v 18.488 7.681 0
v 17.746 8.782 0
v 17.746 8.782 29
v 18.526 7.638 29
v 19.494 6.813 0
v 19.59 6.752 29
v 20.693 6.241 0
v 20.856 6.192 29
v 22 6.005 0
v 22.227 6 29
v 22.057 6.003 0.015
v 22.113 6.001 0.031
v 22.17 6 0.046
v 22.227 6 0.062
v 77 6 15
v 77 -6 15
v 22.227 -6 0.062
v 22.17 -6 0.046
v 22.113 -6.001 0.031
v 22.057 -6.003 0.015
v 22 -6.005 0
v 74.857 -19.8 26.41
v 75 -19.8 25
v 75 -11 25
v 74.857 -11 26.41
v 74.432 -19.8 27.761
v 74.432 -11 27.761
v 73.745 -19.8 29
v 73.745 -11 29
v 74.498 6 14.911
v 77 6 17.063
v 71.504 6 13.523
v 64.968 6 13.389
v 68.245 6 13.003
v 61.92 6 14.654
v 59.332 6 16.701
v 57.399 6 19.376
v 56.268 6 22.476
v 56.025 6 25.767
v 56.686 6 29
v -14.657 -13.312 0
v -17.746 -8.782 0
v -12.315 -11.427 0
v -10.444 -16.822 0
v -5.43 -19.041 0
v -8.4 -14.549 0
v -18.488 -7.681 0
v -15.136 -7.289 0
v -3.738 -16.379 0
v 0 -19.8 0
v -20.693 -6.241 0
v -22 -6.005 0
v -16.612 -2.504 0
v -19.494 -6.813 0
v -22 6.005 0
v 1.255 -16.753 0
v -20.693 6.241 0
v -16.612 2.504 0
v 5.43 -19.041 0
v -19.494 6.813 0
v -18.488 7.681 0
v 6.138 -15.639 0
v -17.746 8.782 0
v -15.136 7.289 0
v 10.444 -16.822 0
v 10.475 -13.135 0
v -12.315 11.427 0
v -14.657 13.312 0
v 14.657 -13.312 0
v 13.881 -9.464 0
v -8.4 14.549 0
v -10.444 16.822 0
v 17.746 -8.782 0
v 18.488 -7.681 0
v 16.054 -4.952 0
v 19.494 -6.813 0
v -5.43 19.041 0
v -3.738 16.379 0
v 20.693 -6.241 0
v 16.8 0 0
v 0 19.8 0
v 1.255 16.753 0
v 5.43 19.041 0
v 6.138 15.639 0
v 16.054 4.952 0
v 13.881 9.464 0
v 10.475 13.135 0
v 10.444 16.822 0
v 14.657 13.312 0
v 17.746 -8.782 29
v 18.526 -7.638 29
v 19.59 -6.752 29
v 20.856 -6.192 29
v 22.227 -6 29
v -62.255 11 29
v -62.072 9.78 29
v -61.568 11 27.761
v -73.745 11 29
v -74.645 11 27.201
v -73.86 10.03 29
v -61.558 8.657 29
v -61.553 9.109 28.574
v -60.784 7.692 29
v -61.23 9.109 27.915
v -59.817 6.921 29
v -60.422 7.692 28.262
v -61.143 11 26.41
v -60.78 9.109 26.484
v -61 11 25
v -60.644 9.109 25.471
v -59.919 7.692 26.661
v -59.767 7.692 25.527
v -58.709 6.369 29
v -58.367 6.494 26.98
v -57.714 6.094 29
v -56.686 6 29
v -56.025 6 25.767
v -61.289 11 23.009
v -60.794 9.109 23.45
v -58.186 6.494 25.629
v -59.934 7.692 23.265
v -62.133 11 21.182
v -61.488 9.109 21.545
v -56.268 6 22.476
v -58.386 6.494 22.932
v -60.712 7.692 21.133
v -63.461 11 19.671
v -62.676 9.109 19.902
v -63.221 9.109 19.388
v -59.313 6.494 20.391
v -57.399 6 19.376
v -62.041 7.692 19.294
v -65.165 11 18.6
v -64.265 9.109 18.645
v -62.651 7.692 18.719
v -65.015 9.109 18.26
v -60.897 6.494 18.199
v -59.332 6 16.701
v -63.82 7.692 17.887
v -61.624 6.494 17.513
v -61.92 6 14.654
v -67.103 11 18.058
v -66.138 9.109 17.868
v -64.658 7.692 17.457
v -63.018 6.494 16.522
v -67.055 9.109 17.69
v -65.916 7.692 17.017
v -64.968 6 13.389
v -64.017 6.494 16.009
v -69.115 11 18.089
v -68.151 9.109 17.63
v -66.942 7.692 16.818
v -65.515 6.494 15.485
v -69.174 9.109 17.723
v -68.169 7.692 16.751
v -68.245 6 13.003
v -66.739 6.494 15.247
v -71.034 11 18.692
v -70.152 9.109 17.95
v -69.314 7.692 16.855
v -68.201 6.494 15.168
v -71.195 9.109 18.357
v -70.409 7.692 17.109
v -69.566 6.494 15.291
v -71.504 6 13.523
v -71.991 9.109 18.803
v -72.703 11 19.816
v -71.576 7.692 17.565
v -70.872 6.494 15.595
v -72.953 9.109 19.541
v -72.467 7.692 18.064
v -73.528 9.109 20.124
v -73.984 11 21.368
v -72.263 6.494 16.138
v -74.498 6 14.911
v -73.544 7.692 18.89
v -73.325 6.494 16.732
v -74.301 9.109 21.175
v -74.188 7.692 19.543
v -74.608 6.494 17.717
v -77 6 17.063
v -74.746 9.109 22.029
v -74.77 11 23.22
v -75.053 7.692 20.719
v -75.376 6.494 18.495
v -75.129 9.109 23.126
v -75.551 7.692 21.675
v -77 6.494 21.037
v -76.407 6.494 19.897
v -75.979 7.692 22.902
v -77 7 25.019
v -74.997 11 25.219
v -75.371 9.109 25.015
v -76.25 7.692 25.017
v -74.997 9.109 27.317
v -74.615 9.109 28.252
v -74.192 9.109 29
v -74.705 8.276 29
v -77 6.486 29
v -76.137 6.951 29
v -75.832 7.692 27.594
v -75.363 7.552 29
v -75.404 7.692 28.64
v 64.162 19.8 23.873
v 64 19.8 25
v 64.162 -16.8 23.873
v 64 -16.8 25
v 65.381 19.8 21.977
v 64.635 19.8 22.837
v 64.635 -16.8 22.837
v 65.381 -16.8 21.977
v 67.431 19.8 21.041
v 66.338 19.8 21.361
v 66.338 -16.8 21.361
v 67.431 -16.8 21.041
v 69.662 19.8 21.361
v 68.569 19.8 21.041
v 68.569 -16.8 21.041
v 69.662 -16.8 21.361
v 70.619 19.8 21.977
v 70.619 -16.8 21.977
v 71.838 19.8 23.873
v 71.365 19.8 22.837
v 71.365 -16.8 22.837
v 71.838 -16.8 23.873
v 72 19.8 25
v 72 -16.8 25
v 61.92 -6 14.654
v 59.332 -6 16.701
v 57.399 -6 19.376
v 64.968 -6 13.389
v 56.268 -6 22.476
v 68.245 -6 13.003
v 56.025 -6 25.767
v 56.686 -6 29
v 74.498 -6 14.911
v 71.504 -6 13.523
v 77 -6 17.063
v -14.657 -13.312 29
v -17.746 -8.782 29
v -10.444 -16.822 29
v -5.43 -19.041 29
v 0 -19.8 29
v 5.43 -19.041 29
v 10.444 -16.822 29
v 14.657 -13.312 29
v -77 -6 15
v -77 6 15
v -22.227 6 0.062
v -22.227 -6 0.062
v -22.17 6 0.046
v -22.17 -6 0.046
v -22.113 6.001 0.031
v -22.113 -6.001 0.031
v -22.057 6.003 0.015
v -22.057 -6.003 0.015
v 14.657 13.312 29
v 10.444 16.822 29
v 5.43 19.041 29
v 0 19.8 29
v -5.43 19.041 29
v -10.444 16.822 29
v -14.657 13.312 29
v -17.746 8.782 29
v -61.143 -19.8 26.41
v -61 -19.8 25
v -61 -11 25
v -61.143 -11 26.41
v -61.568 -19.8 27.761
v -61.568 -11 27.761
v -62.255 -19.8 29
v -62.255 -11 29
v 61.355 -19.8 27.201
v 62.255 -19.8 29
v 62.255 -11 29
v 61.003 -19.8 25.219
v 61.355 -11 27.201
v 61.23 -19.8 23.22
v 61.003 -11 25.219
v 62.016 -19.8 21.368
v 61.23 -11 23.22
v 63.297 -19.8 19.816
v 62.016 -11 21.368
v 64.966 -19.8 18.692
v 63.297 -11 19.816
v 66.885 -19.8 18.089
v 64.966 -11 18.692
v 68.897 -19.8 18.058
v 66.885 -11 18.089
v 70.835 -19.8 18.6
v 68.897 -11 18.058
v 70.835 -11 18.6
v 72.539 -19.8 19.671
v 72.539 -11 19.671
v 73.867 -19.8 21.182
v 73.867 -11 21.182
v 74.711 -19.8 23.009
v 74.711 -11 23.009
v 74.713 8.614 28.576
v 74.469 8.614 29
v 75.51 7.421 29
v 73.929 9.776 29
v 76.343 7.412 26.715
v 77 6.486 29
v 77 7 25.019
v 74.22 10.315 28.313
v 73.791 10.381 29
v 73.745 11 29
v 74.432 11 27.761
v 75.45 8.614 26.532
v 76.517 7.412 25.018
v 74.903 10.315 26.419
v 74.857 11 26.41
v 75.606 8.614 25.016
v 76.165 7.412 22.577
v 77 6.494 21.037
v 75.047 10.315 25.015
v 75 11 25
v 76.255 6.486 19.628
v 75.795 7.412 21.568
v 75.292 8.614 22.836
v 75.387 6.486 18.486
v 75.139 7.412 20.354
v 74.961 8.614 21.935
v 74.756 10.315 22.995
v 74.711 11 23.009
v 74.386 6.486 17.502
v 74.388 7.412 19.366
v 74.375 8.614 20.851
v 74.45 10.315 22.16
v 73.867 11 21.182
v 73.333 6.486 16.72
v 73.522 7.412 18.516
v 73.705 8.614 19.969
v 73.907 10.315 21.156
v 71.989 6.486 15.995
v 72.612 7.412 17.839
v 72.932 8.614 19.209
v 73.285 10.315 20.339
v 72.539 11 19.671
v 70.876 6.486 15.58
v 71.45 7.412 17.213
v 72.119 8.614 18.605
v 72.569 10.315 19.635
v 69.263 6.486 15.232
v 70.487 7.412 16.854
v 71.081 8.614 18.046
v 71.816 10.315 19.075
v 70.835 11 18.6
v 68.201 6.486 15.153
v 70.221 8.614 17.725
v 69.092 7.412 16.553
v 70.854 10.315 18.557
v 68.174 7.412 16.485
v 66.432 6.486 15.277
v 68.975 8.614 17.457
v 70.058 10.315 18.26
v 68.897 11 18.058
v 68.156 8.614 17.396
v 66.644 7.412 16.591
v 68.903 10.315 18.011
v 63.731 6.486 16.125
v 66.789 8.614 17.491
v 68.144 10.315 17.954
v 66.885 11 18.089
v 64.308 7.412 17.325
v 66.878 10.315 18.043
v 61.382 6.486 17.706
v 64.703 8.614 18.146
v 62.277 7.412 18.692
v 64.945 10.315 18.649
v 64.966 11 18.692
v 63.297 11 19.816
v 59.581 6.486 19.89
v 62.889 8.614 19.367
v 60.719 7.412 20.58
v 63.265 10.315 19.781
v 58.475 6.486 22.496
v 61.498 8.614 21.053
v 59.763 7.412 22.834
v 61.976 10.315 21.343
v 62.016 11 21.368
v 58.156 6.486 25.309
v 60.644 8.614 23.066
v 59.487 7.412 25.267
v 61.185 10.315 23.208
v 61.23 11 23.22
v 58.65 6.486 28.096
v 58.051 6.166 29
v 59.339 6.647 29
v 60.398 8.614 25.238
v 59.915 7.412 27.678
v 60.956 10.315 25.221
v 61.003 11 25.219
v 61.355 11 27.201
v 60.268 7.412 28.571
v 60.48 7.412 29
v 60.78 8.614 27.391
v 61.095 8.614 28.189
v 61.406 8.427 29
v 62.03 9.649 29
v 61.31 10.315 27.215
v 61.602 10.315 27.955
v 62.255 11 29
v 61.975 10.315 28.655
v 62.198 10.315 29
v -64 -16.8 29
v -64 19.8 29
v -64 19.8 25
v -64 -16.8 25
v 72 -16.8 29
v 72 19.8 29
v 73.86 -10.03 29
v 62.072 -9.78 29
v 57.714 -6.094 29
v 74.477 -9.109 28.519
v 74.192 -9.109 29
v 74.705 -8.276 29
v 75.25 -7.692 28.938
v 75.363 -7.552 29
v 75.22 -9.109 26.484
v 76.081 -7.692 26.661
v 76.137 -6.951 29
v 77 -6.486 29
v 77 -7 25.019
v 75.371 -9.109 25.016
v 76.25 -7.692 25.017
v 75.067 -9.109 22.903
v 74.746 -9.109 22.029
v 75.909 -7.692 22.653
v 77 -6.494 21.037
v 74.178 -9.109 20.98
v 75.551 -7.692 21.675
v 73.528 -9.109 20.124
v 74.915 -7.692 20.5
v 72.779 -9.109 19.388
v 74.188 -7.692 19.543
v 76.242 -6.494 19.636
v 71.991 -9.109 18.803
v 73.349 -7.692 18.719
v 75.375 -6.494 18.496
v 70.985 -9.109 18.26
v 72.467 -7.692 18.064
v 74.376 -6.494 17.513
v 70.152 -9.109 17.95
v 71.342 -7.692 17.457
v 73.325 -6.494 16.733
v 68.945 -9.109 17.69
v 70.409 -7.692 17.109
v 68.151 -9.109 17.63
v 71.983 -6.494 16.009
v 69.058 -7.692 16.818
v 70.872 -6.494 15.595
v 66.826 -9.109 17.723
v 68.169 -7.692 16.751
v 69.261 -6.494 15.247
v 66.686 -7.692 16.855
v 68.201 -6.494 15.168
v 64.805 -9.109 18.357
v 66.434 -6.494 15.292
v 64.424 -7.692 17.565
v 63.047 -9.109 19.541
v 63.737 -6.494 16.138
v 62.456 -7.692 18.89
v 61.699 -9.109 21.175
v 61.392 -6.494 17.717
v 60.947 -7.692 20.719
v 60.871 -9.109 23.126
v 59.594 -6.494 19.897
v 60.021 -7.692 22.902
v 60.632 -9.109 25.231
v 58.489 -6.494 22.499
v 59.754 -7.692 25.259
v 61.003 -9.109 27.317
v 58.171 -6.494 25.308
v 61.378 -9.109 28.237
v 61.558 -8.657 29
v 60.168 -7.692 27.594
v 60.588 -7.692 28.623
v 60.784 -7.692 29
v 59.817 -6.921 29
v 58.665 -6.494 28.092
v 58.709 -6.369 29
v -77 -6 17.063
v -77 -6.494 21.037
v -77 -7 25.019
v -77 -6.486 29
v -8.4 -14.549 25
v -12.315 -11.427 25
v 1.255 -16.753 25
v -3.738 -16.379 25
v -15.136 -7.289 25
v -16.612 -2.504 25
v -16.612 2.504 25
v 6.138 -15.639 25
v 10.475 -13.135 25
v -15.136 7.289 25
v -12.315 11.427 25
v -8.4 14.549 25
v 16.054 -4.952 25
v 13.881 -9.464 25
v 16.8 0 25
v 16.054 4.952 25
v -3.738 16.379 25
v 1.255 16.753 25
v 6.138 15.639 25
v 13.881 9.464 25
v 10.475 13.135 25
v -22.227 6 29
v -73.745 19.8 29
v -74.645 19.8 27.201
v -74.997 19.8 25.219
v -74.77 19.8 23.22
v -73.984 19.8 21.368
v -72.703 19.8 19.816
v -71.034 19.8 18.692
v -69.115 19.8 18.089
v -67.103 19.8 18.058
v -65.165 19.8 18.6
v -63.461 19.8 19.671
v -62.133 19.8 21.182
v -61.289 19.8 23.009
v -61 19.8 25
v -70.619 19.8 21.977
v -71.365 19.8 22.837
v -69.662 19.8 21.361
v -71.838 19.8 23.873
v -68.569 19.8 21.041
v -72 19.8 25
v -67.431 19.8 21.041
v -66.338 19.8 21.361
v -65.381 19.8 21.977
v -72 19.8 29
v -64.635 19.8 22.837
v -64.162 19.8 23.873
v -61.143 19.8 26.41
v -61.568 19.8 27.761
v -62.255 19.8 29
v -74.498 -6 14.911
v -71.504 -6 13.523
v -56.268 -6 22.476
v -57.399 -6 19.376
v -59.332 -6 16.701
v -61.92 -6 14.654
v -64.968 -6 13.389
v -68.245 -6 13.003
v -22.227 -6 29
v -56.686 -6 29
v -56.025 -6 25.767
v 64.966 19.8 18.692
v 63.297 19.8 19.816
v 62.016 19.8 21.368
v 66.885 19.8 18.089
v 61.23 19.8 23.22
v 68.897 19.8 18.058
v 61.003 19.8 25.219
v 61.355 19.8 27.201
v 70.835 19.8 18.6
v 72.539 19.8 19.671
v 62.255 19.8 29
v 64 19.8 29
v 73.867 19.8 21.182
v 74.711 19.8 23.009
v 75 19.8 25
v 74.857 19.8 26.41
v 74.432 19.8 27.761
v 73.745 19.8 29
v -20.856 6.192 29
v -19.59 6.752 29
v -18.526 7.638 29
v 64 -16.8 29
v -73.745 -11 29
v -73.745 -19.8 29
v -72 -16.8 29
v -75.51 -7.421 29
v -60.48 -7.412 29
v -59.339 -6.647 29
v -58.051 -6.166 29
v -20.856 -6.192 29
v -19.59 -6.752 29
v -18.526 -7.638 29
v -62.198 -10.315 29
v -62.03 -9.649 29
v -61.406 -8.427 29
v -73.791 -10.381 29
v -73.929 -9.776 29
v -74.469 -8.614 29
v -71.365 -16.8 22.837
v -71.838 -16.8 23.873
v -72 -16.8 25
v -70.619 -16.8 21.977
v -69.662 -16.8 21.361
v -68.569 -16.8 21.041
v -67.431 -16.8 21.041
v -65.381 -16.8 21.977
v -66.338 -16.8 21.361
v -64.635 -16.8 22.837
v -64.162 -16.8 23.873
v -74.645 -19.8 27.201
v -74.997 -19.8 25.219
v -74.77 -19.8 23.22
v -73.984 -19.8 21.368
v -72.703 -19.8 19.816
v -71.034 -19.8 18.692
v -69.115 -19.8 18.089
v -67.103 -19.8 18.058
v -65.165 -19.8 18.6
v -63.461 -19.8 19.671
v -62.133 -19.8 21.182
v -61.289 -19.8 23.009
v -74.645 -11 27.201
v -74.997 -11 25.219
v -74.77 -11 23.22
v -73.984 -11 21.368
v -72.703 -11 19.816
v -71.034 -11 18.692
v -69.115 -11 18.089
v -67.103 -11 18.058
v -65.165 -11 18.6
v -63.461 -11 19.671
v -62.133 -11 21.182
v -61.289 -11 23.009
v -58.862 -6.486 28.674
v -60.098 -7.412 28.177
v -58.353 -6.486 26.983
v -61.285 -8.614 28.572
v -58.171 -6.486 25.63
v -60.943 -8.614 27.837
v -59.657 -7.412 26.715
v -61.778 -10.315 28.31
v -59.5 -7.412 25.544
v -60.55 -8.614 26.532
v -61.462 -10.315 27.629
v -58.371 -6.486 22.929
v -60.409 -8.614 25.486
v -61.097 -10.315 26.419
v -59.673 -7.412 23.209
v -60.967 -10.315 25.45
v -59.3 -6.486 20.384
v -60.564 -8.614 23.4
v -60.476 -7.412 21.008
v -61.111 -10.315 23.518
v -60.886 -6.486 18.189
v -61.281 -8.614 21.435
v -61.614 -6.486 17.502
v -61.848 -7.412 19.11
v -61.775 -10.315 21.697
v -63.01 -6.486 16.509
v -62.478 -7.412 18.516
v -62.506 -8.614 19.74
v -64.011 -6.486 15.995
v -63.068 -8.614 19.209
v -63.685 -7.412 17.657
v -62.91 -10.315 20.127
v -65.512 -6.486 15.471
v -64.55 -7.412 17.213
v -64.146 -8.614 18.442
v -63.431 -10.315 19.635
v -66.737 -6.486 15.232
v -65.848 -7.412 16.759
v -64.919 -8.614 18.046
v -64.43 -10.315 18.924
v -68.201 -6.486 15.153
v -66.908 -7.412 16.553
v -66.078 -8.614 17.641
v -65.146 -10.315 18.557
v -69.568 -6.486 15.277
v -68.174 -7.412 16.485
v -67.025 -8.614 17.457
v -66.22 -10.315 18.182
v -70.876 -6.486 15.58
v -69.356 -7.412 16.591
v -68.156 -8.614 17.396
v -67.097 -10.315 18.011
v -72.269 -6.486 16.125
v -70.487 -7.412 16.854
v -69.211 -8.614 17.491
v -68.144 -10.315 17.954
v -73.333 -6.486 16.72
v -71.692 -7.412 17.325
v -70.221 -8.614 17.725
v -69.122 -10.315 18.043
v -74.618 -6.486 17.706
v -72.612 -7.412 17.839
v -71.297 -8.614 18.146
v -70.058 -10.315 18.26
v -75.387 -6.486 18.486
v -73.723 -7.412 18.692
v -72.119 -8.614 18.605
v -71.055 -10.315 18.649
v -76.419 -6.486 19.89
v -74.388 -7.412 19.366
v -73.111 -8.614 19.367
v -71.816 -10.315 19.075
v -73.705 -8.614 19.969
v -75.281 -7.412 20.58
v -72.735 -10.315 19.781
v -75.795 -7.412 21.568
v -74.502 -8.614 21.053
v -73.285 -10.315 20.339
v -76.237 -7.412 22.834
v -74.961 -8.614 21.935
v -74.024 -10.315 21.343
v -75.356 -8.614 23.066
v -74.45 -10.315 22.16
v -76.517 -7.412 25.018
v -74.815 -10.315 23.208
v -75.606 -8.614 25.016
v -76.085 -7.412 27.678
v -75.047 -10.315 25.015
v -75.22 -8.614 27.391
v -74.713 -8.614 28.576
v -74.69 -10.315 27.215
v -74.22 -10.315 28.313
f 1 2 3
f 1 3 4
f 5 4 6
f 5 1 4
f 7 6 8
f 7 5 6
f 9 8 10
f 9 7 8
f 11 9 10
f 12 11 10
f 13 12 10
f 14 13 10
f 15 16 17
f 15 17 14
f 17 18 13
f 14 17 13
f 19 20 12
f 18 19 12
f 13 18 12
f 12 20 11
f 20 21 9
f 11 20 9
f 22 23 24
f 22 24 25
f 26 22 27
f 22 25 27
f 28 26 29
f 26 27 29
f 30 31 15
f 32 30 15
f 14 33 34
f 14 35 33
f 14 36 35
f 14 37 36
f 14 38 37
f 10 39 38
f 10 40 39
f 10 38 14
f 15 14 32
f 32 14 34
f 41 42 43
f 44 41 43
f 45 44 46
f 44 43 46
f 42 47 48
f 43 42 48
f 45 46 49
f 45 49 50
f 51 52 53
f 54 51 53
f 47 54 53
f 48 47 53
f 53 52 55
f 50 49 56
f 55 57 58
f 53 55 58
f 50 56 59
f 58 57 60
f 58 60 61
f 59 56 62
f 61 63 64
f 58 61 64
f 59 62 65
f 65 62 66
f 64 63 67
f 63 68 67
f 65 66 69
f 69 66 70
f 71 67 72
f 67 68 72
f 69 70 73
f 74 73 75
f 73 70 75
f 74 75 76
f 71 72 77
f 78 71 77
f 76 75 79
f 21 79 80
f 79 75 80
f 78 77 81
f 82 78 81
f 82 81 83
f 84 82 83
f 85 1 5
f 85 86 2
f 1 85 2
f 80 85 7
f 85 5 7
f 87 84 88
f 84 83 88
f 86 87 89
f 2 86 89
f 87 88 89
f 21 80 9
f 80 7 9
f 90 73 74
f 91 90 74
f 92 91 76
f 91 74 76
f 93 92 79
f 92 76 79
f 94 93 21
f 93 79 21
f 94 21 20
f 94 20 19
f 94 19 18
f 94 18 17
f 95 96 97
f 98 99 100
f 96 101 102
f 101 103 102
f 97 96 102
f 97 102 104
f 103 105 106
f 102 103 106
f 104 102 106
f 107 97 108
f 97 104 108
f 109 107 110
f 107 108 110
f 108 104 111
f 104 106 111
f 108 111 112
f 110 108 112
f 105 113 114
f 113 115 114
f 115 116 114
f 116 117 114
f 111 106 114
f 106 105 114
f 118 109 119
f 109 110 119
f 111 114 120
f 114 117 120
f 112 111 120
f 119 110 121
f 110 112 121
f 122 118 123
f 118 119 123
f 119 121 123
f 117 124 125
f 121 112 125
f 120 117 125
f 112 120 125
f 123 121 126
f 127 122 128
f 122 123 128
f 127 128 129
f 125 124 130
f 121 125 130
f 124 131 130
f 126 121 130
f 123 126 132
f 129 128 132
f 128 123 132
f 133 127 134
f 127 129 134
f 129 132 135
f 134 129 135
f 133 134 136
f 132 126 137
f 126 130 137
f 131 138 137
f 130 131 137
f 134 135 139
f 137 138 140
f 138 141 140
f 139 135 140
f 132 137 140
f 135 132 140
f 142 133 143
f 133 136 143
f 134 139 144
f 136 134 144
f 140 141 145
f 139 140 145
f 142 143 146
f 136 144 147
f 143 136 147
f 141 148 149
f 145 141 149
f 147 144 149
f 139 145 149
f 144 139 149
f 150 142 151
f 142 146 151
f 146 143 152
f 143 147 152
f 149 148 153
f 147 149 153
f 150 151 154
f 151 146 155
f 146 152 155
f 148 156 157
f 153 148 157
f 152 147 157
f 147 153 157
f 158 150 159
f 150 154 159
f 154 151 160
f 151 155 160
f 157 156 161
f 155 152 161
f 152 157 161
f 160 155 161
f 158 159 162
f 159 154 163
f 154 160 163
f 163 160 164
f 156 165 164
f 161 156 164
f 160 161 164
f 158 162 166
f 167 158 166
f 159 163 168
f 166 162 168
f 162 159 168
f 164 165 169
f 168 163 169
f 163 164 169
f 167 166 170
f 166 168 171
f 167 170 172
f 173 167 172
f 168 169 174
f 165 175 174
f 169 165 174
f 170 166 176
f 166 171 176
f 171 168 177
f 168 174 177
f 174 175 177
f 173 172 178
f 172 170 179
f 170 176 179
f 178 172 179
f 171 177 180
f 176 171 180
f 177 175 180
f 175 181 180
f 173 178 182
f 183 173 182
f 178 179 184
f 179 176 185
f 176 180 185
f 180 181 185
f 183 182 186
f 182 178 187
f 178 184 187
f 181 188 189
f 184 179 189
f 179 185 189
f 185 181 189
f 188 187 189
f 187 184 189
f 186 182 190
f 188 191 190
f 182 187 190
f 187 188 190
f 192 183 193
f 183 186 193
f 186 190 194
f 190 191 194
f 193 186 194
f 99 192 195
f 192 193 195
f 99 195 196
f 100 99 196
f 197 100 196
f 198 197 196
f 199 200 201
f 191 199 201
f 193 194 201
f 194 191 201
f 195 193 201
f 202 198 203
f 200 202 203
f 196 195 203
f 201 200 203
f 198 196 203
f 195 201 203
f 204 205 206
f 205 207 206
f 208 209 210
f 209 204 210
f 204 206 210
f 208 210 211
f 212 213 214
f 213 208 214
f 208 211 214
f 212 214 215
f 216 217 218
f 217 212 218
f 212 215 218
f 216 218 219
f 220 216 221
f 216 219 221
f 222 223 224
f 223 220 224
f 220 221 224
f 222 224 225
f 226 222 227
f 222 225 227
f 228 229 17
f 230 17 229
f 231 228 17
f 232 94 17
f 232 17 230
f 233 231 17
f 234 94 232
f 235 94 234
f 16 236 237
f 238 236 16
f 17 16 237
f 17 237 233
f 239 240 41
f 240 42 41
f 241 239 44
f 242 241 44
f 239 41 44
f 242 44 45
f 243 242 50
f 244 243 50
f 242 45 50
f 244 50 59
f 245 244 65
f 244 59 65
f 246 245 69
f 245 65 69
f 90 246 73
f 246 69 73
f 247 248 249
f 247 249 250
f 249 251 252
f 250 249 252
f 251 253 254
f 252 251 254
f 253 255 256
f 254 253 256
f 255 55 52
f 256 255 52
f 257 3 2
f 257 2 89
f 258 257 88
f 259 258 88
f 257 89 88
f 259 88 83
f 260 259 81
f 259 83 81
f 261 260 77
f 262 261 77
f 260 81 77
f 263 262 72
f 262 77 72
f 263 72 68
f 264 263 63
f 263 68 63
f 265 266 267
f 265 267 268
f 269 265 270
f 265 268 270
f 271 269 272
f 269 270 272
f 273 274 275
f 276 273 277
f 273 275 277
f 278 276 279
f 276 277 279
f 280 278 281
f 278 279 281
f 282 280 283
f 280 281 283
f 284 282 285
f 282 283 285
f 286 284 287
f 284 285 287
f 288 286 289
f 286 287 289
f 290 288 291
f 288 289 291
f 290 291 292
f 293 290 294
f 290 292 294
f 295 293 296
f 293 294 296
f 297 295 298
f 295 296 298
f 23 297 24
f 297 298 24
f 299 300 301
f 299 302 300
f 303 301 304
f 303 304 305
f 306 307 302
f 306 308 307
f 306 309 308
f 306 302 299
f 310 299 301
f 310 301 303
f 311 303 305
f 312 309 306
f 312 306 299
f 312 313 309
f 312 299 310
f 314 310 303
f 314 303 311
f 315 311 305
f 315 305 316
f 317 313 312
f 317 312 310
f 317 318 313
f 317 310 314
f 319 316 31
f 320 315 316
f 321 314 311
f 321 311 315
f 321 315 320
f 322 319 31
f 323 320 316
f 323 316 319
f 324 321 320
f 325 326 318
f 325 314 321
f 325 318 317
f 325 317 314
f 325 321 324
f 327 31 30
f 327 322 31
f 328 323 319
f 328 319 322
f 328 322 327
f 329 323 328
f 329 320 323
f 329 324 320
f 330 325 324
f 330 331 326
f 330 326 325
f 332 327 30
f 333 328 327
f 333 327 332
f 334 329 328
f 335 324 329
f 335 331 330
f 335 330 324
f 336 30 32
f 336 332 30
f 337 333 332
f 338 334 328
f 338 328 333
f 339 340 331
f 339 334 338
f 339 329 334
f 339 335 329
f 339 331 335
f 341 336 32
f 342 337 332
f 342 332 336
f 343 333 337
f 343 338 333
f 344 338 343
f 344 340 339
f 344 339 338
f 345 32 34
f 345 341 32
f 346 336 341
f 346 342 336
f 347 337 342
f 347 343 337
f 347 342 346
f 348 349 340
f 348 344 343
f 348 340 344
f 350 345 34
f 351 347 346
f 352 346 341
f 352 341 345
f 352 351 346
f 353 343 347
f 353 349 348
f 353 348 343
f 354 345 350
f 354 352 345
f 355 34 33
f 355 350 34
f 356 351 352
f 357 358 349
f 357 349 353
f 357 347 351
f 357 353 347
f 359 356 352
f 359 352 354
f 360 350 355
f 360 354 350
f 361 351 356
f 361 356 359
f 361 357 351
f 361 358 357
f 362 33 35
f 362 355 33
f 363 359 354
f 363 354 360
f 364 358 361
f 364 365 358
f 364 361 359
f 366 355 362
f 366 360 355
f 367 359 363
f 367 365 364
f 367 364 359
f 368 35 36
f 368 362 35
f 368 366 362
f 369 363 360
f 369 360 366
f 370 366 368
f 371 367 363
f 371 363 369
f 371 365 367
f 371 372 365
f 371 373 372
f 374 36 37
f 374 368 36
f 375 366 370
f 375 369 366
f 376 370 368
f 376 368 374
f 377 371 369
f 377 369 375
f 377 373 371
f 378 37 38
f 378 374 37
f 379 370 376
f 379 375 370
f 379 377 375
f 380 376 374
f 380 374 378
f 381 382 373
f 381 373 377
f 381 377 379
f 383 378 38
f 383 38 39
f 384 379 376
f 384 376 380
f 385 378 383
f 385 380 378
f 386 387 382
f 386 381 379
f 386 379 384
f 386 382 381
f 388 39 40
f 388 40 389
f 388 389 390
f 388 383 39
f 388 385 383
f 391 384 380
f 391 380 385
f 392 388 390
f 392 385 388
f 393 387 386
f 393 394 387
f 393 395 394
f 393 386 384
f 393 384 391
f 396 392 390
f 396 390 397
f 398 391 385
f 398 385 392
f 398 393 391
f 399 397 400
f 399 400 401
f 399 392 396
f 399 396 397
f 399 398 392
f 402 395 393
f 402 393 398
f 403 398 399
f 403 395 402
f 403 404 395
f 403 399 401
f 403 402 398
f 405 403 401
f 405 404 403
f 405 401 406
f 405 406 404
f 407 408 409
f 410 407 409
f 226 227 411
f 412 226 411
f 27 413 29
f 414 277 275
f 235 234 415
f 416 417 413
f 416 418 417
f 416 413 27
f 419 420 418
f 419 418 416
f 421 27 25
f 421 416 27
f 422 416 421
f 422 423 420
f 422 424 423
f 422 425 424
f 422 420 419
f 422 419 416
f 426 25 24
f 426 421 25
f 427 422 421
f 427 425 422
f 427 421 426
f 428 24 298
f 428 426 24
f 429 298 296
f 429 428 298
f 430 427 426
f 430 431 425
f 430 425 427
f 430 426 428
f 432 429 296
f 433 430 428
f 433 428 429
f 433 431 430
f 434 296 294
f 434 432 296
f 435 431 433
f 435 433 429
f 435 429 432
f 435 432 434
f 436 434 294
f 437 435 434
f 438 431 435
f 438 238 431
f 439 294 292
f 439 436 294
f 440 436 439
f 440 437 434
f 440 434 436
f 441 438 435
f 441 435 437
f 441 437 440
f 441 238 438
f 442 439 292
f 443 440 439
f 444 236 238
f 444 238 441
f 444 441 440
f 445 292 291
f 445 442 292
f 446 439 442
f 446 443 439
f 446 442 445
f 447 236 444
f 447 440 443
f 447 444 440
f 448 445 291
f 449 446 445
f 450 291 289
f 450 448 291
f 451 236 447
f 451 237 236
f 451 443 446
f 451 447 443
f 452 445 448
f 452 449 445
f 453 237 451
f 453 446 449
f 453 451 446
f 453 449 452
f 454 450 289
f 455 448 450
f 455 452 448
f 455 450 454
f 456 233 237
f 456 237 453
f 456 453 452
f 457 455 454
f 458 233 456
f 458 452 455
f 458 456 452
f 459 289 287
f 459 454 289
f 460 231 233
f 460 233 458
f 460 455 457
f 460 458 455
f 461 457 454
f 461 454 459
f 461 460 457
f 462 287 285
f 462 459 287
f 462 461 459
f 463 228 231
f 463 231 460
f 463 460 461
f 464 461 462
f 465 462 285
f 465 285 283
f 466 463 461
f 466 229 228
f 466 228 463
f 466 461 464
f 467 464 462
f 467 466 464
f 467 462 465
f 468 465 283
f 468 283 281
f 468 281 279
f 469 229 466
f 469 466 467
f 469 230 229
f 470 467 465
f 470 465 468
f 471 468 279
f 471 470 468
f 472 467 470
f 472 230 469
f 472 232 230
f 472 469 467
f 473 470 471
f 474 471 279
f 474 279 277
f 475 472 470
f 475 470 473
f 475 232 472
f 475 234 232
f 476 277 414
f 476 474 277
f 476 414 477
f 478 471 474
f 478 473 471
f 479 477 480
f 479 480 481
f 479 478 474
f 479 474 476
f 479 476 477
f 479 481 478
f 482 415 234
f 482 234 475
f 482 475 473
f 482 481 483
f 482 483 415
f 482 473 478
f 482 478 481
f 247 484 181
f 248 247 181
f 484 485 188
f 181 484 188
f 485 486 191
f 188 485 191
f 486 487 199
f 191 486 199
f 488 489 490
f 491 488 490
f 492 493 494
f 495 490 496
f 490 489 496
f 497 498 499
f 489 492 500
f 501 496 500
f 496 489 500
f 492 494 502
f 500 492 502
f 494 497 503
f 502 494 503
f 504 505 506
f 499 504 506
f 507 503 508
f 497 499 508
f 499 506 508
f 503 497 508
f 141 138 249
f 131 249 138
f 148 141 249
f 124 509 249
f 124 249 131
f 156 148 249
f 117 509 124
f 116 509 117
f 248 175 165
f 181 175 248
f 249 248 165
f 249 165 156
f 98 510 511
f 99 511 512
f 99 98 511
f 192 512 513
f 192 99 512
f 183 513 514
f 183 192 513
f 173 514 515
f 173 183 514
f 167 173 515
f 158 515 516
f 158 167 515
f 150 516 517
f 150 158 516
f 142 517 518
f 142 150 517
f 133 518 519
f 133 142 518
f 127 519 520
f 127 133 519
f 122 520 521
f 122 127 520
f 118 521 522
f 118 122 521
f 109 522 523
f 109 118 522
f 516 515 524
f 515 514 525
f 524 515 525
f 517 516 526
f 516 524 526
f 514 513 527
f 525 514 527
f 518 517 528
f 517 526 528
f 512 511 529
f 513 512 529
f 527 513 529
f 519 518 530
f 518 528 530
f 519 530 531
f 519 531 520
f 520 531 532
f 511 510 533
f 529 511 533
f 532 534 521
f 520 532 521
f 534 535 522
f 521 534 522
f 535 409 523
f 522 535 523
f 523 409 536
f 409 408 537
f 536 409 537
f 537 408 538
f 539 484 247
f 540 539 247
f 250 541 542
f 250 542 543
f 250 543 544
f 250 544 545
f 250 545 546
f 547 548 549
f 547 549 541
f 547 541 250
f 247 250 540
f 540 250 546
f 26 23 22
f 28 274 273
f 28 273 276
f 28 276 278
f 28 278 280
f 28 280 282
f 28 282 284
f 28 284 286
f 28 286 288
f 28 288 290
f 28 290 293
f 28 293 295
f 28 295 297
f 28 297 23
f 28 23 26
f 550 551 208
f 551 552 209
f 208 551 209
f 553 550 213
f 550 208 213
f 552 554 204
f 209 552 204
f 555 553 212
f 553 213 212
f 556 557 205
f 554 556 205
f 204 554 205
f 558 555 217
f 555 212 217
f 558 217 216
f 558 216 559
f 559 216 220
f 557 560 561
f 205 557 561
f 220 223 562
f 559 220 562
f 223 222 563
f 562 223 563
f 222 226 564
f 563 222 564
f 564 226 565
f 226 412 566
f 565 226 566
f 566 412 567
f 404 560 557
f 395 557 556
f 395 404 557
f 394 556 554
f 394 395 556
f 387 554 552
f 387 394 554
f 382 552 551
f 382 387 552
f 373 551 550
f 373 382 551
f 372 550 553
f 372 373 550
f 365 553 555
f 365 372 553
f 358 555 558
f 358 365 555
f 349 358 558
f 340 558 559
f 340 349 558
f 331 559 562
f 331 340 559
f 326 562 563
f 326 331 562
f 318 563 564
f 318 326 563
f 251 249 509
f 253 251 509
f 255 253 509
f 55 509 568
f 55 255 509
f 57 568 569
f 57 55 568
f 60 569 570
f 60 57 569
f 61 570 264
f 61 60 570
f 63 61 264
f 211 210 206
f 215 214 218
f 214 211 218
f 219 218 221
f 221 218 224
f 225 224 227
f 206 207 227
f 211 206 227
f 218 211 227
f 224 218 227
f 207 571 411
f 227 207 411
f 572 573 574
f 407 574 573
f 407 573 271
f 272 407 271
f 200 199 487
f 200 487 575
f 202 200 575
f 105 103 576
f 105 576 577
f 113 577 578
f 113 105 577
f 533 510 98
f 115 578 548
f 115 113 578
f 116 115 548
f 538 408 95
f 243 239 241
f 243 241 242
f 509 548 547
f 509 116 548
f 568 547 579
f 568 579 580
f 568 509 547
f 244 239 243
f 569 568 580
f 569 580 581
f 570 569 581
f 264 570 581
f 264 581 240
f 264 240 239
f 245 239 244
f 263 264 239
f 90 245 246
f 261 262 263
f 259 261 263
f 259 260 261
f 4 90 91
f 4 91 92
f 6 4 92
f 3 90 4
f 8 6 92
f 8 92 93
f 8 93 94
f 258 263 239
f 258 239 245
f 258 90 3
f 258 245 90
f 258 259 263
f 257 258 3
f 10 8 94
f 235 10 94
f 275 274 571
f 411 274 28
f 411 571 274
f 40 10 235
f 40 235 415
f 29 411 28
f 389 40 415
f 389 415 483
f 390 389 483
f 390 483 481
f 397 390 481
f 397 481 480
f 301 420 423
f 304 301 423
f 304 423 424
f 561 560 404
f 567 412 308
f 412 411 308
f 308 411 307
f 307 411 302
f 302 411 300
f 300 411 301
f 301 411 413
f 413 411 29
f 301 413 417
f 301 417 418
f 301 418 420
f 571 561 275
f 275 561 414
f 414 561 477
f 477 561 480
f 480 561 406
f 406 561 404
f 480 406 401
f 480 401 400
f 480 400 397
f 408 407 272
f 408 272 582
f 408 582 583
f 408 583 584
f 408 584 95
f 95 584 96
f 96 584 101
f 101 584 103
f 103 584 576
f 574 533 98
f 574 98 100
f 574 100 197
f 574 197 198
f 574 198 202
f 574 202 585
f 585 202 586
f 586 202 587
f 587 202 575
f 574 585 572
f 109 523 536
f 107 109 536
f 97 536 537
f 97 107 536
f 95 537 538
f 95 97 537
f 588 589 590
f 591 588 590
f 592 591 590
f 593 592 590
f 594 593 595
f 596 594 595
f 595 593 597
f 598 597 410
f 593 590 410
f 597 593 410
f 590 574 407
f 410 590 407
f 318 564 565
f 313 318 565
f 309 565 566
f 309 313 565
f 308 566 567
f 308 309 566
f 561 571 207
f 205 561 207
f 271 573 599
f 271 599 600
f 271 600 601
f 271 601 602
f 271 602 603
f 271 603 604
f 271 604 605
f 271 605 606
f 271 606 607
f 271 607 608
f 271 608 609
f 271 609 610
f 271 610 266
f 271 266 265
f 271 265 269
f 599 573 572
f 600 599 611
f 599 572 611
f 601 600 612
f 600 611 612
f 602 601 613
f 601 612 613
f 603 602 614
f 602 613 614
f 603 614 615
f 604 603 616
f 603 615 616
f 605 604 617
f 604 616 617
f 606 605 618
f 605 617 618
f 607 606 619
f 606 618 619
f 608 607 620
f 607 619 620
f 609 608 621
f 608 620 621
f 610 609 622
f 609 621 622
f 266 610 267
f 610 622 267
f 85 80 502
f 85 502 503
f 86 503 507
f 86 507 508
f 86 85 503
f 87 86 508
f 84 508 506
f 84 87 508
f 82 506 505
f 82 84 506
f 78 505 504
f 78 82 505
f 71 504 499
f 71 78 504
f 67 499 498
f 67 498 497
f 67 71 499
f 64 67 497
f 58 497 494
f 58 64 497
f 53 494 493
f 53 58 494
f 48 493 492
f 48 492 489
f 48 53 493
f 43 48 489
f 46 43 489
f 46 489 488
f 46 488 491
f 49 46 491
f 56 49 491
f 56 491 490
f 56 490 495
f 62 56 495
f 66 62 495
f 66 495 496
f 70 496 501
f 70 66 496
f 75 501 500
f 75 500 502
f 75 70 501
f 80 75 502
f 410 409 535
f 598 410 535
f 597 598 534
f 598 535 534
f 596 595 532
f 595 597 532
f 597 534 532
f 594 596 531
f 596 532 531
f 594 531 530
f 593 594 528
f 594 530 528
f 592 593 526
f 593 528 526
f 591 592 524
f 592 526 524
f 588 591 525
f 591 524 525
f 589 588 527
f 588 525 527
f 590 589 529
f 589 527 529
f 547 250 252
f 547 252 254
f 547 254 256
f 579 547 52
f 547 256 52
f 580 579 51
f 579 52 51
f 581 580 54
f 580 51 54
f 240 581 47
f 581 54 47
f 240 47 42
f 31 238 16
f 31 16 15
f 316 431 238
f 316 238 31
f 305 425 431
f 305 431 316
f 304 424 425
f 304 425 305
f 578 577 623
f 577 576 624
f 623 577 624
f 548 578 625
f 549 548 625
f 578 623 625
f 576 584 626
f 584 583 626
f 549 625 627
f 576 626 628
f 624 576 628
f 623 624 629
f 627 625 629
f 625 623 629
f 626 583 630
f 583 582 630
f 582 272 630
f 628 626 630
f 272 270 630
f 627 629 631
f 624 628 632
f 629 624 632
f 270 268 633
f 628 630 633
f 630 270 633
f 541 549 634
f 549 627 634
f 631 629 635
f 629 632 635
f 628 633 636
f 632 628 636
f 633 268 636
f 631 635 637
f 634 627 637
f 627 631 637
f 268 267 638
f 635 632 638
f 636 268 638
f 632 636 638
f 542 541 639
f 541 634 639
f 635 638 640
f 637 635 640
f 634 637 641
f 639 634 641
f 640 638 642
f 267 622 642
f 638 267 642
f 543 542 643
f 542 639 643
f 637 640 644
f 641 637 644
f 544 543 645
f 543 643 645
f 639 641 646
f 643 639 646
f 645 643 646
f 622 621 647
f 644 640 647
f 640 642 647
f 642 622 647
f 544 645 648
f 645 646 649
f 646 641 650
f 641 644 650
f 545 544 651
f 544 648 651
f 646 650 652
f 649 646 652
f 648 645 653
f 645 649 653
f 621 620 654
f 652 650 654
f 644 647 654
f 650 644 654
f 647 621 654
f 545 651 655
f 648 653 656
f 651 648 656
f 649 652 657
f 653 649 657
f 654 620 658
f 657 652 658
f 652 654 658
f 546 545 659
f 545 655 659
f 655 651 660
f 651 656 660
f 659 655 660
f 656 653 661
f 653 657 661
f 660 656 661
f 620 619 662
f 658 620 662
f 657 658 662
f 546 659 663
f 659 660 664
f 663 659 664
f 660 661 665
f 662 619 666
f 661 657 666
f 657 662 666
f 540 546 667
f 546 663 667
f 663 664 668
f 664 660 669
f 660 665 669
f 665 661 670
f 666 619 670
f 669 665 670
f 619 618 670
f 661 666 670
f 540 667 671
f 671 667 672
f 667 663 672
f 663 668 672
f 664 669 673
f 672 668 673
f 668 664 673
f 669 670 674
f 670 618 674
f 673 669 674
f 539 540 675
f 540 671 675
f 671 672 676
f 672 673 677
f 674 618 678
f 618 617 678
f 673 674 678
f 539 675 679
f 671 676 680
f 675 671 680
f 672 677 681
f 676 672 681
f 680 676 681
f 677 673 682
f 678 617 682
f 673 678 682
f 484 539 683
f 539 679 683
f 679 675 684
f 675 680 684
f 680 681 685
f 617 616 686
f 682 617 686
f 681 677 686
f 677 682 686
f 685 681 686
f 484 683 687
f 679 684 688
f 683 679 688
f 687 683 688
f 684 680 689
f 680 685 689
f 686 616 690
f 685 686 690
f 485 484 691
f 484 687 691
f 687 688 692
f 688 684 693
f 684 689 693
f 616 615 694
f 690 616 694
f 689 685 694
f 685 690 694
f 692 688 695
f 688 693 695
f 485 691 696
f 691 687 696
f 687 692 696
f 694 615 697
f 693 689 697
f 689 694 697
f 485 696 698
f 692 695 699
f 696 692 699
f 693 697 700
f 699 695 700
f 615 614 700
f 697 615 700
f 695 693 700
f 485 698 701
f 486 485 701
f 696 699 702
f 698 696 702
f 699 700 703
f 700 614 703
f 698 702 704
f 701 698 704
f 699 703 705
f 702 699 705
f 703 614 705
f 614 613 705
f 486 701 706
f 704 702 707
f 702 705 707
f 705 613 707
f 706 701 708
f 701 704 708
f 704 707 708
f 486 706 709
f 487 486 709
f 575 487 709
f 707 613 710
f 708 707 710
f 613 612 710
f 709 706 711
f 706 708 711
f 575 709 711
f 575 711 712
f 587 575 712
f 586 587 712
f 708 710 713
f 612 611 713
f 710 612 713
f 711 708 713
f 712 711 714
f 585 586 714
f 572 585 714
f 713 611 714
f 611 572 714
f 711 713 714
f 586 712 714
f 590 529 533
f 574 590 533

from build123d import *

# Parameters (mm, degrees)
F0_R           = 19.8
F0_R_2         = 16.8
F1_DEPTH       = 25
F2_R           = 19.8
F2_R_2         = 16.8
F3_DEPTH       = 4
F5_DEPTH       = 29
F6_SIZE2       = 55
F6_SIZE        = 15
F6_2_SIZE2     = 55
F6_2_SIZE      = 15
F7_R           = 5
F9_DEPTH       = 25
F10_DEPTH      = 13.8
F10_DEPTH_BACK = 25.8
F11_T4_ANGLE   = 359.64
F11_T10_ANGLE  = 359.64
F11_T16_ANGLE  = 359.64
F11_T22_ANGLE  = 359.64
F12_W          = 8
F12_H          = 8
F13_DEPTH      = 3


# Not quite as in the source:
# - a fillet or chamfer that OpenCascade refuses, or shapes differently, is made with other operations: its cross-section is extruded or revolved along the edge and cut away or added


with BuildPart() as f1:
    # F0 (on Top) → F1 (new body)
    with BuildSketch(Plane.XY):
        Circle(F0_R)
        Circle(F0_R_2, mode=Mode.SUBTRACT)
    extrude(amount=F1_DEPTH)

    # F2 (on face) → F3 (join)
    with BuildSketch(Plane.XY.offset(25)):
        Circle(F2_R)
        Circle(F2_R_2, mode=Mode.SUBTRACT)
        Circle(F2_R_2)
    extrude(amount=F3_DEPTH)

    # F4 (on face) → F5 (join)
    with BuildSketch(Plane.XY.offset(29)):
        with BuildLine():
            Line((-77, -6), (-18.8690222322, -6))
            ThreePointArc((-18.8690222322, -6), (-19.8, 0), (-18.8690222322, 6))
            Line((-18.8690222322, 6), (-77, 6))
            Line((-77, 6), (-77, -6))
        make_face()
        with BuildLine():
            Line((18.8690222322, -6), (77, -6))
            Line((77, -6), (77, 6))
            Line((77, 6), (18.8690222322, 6))
            ThreePointArc((18.8690222322, 6), (19.5658713095, 3.0358985327), (19.8, 0))
            ThreePointArc((19.8, 0), (19.5658713095, -3.0358985327), (18.8690222322, -6))
        make_face()
    extrude(amount=-F5_DEPTH)

    # F6
    f6_edges = [f1.edges().sort_by_distance(p)[0] for p in [
        (77, 0, 0),
    ]]
    f6_side = f1.faces().sort_by_distance((77, 0, 14.5))[0]
    chamfer(f6_edges, length=F6_SIZE, length2=F6_SIZE2, reference=f6_side)

    # F6#2
    f6_2_edges = [f1.edges().sort_by_distance(p)[0] for p in [
        (-77, 0, 0),
    ]]
    f6_2_side = f1.faces().sort_by_distance((-77, 0, 14.5))[0]
    chamfer(f6_2_edges, length=F6_2_SIZE, length2=F6_2_SIZE2, reference=f6_2_side)

    # F7 (call 1 of 4: OpenCascade refuses the feature's edges together)
    f7_edges = [f1.edges().sort_by_distance(p)[0] for p in [
        (-18.869022, 6, 14.5),
    ]]
    fillet(f7_edges, radius=F7_R)

    # F7#2 (call 2 of 4)
    f7_2_edges = [f1.edges().sort_by_distance(p)[0] for p in [
        (18.869022, 6, 14.5),
    ]]
    fillet(f7_2_edges, radius=F7_R)

    # F7#3 (call 3 of 4)
    f7_3_edges = [f1.edges().sort_by_distance(p)[0] for p in [
        (-18.869022, -6, 14.5),
    ]]
    fillet(f7_3_edges, radius=F7_R)

    # F7#4 (call 4 of 4)
    f7_4_edges = [f1.edges().sort_by_distance(p)[0] for p in [
        (18.869022, -6, 14.5),
    ]]
    fillet(f7_4_edges, radius=F7_R)

    # F8 (on face) → F9 (cut)
    with BuildSketch(Plane.XZ.offset(6)):
        with BuildLine():
            ThreePointArc((68, 29), (70.8284271247, 27.8284271247), (72, 25))
            Line((72, 25), (72, 29))
            Line((72, 29), (68, 29))
        make_face()
        with BuildLine():
            Line((64, 29), (64, 25))
            ThreePointArc((64, 25), (65.1715728753, 27.8284271247), (68, 29))
            Line((68, 29), (64, 29))
        make_face()
        with BuildLine():
            ThreePointArc((68, 29), (65.1715728753, 27.8284271247), (64, 25))
            ThreePointArc((64, 25), (68, 21), (72, 25))
            ThreePointArc((72, 25), (70.8284271247, 27.8284271247), (68, 29))
        make_face()
        with BuildLine():
            Line((-72, 29), (-72, 25))
            ThreePointArc((-72, 25), (-70.8284271247, 27.8284271247), (-68, 29))
            Line((-68, 29), (-72, 29))
        make_face()
        with BuildLine():
            ThreePointArc((-68, 29), (-65.1715728753, 27.8284271247), (-64, 25))
            Line((-64, 25), (-64, 29))
            Line((-64, 29), (-68, 29))
        make_face()
        with BuildLine():
            ThreePointArc((-68, 29), (-70.8284271247, 27.8284271247), (-72, 25))
            ThreePointArc((-72, 25), (-68, 21), (-64, 25))
            ThreePointArc((-64, 25), (-65.1715728753, 27.8284271247), (-68, 29))
        make_face()
    extrude(amount=-F9_DEPTH, mode=Mode.SUBTRACT)

    # F8 (on face) → F10 (join, two sides)
    with BuildSketch(Plane.XZ.offset(6)) as f10_sk:
        with BuildLine():
            ThreePointArc((-64, 25), (-68, 21), (-72, 25))
            Line((-72, 25), (-72, 29))
            Line((-72, 29), (-73.7445626465, 29))
            ThreePointArc((-73.7445626465, 29), (-70.0961943462, 18.3212299588), (-61, 25))
            ThreePointArc((-61, 25), (-61.3212299588, 27.0961943462), (-62.2554373535, 29))
            Line((-62.2554373535, 29), (-64, 29))
            Line((-64, 29), (-64, 25))
        make_face()
        with BuildLine():
            ThreePointArc((72, 25), (68, 21), (64, 25))
            Line((64, 25), (64, 29))
            Line((64, 29), (62.2554373535, 29))
            ThreePointArc((62.2554373535, 29), (65.9038056538, 18.3212299588), (75, 25))
            ThreePointArc((75, 25), (74.6787700412, 27.0961943462), (73.7445626465, 29))
            Line((73.7445626465, 29), (72, 29))
            Line((72, 29), (72, 25))
        make_face()
    extrude(amount=F10_DEPTH)
    extrude(f10_sk.sketch, amount=-F10_DEPTH_BACK)

    # F11: fillet of radius 5 on 4 edges, made by hand


with BuildPart() as f11_tool2:
    # F11_s3 → F11_t4 (revolve)
    with BuildSketch(Plane(origin=(67.9207895695, 0, -0.2133801555), x_dir=(0, 1, 0), z_dir=(-0.9999950652, 0, 0.0031415875))):
        with BuildLine():
            ThreePointArc((6, -37.2135045791), (7.4644660941, -33.6779706732), (11, -32.2135045791))
            Line((11, -32.2135045791), (6, -32.2135045791))
            Line((6, -32.2135045791), (6, -37.2135045791))
        make_face()
    revolve(axis=Axis((68, 6, 25), (0, 1, 0)), revolution_arc=F11_T4_ANGLE)

    split(bisect_by=Plane.XY.offset(29), keep=Keep.BOTTOM)

    split(bisect_by=Plane.YZ.offset(77), keep=Keep.BOTTOM)


with BuildPart() as f1_1:
    add(f1.part)

    # F11_t1: union F11_tool2
    add(f11_tool2.part)


with BuildPart() as f11_tool8:
    # F11_s9 → F11_t10 (revolve)
    with BuildSketch(Plane(origin=(67.9207895695, 0, -0.2133801555), x_dir=(0, 1, 0), z_dir=(-0.9999950652, 0, 0.0031415875))):
        with BuildLine():
            ThreePointArc((-11, -32.2135045791), (-7.4644660941, -33.6779706732), (-6, -37.2135045791))
            Line((-6, -37.2135045791), (-6, -32.2135045791))
            Line((-6, -32.2135045791), (-11, -32.2135045791))
        make_face()
    revolve(axis=Axis((68, -6, 25), (0, 1, 0)), revolution_arc=F11_T10_ANGLE)

    split(bisect_by=Plane.XY.offset(29), keep=Keep.BOTTOM)

    split(bisect_by=Plane.YZ.offset(77), keep=Keep.BOTTOM)


with BuildPart() as f1_2:
    add(f1_1.part)

    # F11_t7: union F11_tool8
    add(f11_tool8.part)


with BuildPart() as f11_tool14:
    # F11_s15 → F11_t16 (revolve)
    with BuildSketch(Plane(origin=(-68.0778681687, 0, 0.2138736341), x_dir=(0, 1, 0), z_dir=(-0.9999950652, 0, 0.0031415875))):
        with BuildLine():
            ThreePointArc((11, -31.786248681), (7.4644660941, -33.2507147751), (6, -36.786248681))
            Line((6, -36.786248681), (6, -31.786248681))
            Line((6, -31.786248681), (11, -31.786248681))
        make_face()
    revolve(axis=Axis((-68, 6, 25), (0, 1, 0)), revolution_arc=F11_T16_ANGLE)

    split(bisect_by=Plane.XY.offset(29), keep=Keep.BOTTOM)

    split(bisect_by=Plane.YZ.offset(-77), keep=Keep.TOP)


with BuildPart() as f1_3:
    add(f1_2.part)

    # F11_t13: union F11_tool14
    add(f11_tool14.part)


with BuildPart() as f11_tool20:
    # F11_s21 → F11_t22 (revolve)
    with BuildSketch(Plane(origin=(-68.0778681687, 0, 0.2138736341), x_dir=(0, 1, 0), z_dir=(-0.9999950652, 0, 0.0031415875))):
        with BuildLine():
            ThreePointArc((-6, -36.786248681), (-7.4644660941, -33.2507147751), (-11, -31.786248681))
            Line((-11, -31.786248681), (-6, -31.786248681))
            Line((-6, -31.786248681), (-6, -36.786248681))
        make_face()
    revolve(axis=Axis((-68, -6, 25), (0, 1, 0)), revolution_arc=F11_T22_ANGLE)

    split(bisect_by=Plane.XY.offset(29), keep=Keep.BOTTOM)

    split(bisect_by=Plane.YZ.offset(-77), keep=Keep.TOP)


with BuildPart() as f1_4:
    add(f1_3.part)

    # F11_t19: union F11_tool20
    add(f11_tool20.part)

    # F12 (on face) → F13 (join)
    with BuildSketch(Plane.XZ.offset(19.8)):
        with Locations((68, 25)):
            Rectangle(F12_W, F12_H)
        with BuildLine():
            Line((-64, 29), (-72, 29))
            Line((-72, 29), (-72, 25))
            ThreePointArc((-72, 25), (-70.8284271247, 22.1715728753), (-68, 21))
            ThreePointArc((-68, 21), (-65.1715728753, 22.1715728753), (-64, 25))
            Line((-64, 25), (-64, 29))
        make_face()
        with BuildLine():
            Line((-64, 21), (-64, 25))
            ThreePointArc((-64, 25), (-65.1715728753, 22.1715728753), (-68, 21))
            Line((-68, 21), (-64, 21))
        make_face()
        with BuildLine():
            ThreePointArc((-68, 21), (-70.8284271247, 22.1715728753), (-72, 25))
            Line((-72, 25), (-72, 21))
            Line((-72, 21), (-68, 21))
        make_face()
    extrude(amount=-F13_DEPTH)


solid = f1_4.part
